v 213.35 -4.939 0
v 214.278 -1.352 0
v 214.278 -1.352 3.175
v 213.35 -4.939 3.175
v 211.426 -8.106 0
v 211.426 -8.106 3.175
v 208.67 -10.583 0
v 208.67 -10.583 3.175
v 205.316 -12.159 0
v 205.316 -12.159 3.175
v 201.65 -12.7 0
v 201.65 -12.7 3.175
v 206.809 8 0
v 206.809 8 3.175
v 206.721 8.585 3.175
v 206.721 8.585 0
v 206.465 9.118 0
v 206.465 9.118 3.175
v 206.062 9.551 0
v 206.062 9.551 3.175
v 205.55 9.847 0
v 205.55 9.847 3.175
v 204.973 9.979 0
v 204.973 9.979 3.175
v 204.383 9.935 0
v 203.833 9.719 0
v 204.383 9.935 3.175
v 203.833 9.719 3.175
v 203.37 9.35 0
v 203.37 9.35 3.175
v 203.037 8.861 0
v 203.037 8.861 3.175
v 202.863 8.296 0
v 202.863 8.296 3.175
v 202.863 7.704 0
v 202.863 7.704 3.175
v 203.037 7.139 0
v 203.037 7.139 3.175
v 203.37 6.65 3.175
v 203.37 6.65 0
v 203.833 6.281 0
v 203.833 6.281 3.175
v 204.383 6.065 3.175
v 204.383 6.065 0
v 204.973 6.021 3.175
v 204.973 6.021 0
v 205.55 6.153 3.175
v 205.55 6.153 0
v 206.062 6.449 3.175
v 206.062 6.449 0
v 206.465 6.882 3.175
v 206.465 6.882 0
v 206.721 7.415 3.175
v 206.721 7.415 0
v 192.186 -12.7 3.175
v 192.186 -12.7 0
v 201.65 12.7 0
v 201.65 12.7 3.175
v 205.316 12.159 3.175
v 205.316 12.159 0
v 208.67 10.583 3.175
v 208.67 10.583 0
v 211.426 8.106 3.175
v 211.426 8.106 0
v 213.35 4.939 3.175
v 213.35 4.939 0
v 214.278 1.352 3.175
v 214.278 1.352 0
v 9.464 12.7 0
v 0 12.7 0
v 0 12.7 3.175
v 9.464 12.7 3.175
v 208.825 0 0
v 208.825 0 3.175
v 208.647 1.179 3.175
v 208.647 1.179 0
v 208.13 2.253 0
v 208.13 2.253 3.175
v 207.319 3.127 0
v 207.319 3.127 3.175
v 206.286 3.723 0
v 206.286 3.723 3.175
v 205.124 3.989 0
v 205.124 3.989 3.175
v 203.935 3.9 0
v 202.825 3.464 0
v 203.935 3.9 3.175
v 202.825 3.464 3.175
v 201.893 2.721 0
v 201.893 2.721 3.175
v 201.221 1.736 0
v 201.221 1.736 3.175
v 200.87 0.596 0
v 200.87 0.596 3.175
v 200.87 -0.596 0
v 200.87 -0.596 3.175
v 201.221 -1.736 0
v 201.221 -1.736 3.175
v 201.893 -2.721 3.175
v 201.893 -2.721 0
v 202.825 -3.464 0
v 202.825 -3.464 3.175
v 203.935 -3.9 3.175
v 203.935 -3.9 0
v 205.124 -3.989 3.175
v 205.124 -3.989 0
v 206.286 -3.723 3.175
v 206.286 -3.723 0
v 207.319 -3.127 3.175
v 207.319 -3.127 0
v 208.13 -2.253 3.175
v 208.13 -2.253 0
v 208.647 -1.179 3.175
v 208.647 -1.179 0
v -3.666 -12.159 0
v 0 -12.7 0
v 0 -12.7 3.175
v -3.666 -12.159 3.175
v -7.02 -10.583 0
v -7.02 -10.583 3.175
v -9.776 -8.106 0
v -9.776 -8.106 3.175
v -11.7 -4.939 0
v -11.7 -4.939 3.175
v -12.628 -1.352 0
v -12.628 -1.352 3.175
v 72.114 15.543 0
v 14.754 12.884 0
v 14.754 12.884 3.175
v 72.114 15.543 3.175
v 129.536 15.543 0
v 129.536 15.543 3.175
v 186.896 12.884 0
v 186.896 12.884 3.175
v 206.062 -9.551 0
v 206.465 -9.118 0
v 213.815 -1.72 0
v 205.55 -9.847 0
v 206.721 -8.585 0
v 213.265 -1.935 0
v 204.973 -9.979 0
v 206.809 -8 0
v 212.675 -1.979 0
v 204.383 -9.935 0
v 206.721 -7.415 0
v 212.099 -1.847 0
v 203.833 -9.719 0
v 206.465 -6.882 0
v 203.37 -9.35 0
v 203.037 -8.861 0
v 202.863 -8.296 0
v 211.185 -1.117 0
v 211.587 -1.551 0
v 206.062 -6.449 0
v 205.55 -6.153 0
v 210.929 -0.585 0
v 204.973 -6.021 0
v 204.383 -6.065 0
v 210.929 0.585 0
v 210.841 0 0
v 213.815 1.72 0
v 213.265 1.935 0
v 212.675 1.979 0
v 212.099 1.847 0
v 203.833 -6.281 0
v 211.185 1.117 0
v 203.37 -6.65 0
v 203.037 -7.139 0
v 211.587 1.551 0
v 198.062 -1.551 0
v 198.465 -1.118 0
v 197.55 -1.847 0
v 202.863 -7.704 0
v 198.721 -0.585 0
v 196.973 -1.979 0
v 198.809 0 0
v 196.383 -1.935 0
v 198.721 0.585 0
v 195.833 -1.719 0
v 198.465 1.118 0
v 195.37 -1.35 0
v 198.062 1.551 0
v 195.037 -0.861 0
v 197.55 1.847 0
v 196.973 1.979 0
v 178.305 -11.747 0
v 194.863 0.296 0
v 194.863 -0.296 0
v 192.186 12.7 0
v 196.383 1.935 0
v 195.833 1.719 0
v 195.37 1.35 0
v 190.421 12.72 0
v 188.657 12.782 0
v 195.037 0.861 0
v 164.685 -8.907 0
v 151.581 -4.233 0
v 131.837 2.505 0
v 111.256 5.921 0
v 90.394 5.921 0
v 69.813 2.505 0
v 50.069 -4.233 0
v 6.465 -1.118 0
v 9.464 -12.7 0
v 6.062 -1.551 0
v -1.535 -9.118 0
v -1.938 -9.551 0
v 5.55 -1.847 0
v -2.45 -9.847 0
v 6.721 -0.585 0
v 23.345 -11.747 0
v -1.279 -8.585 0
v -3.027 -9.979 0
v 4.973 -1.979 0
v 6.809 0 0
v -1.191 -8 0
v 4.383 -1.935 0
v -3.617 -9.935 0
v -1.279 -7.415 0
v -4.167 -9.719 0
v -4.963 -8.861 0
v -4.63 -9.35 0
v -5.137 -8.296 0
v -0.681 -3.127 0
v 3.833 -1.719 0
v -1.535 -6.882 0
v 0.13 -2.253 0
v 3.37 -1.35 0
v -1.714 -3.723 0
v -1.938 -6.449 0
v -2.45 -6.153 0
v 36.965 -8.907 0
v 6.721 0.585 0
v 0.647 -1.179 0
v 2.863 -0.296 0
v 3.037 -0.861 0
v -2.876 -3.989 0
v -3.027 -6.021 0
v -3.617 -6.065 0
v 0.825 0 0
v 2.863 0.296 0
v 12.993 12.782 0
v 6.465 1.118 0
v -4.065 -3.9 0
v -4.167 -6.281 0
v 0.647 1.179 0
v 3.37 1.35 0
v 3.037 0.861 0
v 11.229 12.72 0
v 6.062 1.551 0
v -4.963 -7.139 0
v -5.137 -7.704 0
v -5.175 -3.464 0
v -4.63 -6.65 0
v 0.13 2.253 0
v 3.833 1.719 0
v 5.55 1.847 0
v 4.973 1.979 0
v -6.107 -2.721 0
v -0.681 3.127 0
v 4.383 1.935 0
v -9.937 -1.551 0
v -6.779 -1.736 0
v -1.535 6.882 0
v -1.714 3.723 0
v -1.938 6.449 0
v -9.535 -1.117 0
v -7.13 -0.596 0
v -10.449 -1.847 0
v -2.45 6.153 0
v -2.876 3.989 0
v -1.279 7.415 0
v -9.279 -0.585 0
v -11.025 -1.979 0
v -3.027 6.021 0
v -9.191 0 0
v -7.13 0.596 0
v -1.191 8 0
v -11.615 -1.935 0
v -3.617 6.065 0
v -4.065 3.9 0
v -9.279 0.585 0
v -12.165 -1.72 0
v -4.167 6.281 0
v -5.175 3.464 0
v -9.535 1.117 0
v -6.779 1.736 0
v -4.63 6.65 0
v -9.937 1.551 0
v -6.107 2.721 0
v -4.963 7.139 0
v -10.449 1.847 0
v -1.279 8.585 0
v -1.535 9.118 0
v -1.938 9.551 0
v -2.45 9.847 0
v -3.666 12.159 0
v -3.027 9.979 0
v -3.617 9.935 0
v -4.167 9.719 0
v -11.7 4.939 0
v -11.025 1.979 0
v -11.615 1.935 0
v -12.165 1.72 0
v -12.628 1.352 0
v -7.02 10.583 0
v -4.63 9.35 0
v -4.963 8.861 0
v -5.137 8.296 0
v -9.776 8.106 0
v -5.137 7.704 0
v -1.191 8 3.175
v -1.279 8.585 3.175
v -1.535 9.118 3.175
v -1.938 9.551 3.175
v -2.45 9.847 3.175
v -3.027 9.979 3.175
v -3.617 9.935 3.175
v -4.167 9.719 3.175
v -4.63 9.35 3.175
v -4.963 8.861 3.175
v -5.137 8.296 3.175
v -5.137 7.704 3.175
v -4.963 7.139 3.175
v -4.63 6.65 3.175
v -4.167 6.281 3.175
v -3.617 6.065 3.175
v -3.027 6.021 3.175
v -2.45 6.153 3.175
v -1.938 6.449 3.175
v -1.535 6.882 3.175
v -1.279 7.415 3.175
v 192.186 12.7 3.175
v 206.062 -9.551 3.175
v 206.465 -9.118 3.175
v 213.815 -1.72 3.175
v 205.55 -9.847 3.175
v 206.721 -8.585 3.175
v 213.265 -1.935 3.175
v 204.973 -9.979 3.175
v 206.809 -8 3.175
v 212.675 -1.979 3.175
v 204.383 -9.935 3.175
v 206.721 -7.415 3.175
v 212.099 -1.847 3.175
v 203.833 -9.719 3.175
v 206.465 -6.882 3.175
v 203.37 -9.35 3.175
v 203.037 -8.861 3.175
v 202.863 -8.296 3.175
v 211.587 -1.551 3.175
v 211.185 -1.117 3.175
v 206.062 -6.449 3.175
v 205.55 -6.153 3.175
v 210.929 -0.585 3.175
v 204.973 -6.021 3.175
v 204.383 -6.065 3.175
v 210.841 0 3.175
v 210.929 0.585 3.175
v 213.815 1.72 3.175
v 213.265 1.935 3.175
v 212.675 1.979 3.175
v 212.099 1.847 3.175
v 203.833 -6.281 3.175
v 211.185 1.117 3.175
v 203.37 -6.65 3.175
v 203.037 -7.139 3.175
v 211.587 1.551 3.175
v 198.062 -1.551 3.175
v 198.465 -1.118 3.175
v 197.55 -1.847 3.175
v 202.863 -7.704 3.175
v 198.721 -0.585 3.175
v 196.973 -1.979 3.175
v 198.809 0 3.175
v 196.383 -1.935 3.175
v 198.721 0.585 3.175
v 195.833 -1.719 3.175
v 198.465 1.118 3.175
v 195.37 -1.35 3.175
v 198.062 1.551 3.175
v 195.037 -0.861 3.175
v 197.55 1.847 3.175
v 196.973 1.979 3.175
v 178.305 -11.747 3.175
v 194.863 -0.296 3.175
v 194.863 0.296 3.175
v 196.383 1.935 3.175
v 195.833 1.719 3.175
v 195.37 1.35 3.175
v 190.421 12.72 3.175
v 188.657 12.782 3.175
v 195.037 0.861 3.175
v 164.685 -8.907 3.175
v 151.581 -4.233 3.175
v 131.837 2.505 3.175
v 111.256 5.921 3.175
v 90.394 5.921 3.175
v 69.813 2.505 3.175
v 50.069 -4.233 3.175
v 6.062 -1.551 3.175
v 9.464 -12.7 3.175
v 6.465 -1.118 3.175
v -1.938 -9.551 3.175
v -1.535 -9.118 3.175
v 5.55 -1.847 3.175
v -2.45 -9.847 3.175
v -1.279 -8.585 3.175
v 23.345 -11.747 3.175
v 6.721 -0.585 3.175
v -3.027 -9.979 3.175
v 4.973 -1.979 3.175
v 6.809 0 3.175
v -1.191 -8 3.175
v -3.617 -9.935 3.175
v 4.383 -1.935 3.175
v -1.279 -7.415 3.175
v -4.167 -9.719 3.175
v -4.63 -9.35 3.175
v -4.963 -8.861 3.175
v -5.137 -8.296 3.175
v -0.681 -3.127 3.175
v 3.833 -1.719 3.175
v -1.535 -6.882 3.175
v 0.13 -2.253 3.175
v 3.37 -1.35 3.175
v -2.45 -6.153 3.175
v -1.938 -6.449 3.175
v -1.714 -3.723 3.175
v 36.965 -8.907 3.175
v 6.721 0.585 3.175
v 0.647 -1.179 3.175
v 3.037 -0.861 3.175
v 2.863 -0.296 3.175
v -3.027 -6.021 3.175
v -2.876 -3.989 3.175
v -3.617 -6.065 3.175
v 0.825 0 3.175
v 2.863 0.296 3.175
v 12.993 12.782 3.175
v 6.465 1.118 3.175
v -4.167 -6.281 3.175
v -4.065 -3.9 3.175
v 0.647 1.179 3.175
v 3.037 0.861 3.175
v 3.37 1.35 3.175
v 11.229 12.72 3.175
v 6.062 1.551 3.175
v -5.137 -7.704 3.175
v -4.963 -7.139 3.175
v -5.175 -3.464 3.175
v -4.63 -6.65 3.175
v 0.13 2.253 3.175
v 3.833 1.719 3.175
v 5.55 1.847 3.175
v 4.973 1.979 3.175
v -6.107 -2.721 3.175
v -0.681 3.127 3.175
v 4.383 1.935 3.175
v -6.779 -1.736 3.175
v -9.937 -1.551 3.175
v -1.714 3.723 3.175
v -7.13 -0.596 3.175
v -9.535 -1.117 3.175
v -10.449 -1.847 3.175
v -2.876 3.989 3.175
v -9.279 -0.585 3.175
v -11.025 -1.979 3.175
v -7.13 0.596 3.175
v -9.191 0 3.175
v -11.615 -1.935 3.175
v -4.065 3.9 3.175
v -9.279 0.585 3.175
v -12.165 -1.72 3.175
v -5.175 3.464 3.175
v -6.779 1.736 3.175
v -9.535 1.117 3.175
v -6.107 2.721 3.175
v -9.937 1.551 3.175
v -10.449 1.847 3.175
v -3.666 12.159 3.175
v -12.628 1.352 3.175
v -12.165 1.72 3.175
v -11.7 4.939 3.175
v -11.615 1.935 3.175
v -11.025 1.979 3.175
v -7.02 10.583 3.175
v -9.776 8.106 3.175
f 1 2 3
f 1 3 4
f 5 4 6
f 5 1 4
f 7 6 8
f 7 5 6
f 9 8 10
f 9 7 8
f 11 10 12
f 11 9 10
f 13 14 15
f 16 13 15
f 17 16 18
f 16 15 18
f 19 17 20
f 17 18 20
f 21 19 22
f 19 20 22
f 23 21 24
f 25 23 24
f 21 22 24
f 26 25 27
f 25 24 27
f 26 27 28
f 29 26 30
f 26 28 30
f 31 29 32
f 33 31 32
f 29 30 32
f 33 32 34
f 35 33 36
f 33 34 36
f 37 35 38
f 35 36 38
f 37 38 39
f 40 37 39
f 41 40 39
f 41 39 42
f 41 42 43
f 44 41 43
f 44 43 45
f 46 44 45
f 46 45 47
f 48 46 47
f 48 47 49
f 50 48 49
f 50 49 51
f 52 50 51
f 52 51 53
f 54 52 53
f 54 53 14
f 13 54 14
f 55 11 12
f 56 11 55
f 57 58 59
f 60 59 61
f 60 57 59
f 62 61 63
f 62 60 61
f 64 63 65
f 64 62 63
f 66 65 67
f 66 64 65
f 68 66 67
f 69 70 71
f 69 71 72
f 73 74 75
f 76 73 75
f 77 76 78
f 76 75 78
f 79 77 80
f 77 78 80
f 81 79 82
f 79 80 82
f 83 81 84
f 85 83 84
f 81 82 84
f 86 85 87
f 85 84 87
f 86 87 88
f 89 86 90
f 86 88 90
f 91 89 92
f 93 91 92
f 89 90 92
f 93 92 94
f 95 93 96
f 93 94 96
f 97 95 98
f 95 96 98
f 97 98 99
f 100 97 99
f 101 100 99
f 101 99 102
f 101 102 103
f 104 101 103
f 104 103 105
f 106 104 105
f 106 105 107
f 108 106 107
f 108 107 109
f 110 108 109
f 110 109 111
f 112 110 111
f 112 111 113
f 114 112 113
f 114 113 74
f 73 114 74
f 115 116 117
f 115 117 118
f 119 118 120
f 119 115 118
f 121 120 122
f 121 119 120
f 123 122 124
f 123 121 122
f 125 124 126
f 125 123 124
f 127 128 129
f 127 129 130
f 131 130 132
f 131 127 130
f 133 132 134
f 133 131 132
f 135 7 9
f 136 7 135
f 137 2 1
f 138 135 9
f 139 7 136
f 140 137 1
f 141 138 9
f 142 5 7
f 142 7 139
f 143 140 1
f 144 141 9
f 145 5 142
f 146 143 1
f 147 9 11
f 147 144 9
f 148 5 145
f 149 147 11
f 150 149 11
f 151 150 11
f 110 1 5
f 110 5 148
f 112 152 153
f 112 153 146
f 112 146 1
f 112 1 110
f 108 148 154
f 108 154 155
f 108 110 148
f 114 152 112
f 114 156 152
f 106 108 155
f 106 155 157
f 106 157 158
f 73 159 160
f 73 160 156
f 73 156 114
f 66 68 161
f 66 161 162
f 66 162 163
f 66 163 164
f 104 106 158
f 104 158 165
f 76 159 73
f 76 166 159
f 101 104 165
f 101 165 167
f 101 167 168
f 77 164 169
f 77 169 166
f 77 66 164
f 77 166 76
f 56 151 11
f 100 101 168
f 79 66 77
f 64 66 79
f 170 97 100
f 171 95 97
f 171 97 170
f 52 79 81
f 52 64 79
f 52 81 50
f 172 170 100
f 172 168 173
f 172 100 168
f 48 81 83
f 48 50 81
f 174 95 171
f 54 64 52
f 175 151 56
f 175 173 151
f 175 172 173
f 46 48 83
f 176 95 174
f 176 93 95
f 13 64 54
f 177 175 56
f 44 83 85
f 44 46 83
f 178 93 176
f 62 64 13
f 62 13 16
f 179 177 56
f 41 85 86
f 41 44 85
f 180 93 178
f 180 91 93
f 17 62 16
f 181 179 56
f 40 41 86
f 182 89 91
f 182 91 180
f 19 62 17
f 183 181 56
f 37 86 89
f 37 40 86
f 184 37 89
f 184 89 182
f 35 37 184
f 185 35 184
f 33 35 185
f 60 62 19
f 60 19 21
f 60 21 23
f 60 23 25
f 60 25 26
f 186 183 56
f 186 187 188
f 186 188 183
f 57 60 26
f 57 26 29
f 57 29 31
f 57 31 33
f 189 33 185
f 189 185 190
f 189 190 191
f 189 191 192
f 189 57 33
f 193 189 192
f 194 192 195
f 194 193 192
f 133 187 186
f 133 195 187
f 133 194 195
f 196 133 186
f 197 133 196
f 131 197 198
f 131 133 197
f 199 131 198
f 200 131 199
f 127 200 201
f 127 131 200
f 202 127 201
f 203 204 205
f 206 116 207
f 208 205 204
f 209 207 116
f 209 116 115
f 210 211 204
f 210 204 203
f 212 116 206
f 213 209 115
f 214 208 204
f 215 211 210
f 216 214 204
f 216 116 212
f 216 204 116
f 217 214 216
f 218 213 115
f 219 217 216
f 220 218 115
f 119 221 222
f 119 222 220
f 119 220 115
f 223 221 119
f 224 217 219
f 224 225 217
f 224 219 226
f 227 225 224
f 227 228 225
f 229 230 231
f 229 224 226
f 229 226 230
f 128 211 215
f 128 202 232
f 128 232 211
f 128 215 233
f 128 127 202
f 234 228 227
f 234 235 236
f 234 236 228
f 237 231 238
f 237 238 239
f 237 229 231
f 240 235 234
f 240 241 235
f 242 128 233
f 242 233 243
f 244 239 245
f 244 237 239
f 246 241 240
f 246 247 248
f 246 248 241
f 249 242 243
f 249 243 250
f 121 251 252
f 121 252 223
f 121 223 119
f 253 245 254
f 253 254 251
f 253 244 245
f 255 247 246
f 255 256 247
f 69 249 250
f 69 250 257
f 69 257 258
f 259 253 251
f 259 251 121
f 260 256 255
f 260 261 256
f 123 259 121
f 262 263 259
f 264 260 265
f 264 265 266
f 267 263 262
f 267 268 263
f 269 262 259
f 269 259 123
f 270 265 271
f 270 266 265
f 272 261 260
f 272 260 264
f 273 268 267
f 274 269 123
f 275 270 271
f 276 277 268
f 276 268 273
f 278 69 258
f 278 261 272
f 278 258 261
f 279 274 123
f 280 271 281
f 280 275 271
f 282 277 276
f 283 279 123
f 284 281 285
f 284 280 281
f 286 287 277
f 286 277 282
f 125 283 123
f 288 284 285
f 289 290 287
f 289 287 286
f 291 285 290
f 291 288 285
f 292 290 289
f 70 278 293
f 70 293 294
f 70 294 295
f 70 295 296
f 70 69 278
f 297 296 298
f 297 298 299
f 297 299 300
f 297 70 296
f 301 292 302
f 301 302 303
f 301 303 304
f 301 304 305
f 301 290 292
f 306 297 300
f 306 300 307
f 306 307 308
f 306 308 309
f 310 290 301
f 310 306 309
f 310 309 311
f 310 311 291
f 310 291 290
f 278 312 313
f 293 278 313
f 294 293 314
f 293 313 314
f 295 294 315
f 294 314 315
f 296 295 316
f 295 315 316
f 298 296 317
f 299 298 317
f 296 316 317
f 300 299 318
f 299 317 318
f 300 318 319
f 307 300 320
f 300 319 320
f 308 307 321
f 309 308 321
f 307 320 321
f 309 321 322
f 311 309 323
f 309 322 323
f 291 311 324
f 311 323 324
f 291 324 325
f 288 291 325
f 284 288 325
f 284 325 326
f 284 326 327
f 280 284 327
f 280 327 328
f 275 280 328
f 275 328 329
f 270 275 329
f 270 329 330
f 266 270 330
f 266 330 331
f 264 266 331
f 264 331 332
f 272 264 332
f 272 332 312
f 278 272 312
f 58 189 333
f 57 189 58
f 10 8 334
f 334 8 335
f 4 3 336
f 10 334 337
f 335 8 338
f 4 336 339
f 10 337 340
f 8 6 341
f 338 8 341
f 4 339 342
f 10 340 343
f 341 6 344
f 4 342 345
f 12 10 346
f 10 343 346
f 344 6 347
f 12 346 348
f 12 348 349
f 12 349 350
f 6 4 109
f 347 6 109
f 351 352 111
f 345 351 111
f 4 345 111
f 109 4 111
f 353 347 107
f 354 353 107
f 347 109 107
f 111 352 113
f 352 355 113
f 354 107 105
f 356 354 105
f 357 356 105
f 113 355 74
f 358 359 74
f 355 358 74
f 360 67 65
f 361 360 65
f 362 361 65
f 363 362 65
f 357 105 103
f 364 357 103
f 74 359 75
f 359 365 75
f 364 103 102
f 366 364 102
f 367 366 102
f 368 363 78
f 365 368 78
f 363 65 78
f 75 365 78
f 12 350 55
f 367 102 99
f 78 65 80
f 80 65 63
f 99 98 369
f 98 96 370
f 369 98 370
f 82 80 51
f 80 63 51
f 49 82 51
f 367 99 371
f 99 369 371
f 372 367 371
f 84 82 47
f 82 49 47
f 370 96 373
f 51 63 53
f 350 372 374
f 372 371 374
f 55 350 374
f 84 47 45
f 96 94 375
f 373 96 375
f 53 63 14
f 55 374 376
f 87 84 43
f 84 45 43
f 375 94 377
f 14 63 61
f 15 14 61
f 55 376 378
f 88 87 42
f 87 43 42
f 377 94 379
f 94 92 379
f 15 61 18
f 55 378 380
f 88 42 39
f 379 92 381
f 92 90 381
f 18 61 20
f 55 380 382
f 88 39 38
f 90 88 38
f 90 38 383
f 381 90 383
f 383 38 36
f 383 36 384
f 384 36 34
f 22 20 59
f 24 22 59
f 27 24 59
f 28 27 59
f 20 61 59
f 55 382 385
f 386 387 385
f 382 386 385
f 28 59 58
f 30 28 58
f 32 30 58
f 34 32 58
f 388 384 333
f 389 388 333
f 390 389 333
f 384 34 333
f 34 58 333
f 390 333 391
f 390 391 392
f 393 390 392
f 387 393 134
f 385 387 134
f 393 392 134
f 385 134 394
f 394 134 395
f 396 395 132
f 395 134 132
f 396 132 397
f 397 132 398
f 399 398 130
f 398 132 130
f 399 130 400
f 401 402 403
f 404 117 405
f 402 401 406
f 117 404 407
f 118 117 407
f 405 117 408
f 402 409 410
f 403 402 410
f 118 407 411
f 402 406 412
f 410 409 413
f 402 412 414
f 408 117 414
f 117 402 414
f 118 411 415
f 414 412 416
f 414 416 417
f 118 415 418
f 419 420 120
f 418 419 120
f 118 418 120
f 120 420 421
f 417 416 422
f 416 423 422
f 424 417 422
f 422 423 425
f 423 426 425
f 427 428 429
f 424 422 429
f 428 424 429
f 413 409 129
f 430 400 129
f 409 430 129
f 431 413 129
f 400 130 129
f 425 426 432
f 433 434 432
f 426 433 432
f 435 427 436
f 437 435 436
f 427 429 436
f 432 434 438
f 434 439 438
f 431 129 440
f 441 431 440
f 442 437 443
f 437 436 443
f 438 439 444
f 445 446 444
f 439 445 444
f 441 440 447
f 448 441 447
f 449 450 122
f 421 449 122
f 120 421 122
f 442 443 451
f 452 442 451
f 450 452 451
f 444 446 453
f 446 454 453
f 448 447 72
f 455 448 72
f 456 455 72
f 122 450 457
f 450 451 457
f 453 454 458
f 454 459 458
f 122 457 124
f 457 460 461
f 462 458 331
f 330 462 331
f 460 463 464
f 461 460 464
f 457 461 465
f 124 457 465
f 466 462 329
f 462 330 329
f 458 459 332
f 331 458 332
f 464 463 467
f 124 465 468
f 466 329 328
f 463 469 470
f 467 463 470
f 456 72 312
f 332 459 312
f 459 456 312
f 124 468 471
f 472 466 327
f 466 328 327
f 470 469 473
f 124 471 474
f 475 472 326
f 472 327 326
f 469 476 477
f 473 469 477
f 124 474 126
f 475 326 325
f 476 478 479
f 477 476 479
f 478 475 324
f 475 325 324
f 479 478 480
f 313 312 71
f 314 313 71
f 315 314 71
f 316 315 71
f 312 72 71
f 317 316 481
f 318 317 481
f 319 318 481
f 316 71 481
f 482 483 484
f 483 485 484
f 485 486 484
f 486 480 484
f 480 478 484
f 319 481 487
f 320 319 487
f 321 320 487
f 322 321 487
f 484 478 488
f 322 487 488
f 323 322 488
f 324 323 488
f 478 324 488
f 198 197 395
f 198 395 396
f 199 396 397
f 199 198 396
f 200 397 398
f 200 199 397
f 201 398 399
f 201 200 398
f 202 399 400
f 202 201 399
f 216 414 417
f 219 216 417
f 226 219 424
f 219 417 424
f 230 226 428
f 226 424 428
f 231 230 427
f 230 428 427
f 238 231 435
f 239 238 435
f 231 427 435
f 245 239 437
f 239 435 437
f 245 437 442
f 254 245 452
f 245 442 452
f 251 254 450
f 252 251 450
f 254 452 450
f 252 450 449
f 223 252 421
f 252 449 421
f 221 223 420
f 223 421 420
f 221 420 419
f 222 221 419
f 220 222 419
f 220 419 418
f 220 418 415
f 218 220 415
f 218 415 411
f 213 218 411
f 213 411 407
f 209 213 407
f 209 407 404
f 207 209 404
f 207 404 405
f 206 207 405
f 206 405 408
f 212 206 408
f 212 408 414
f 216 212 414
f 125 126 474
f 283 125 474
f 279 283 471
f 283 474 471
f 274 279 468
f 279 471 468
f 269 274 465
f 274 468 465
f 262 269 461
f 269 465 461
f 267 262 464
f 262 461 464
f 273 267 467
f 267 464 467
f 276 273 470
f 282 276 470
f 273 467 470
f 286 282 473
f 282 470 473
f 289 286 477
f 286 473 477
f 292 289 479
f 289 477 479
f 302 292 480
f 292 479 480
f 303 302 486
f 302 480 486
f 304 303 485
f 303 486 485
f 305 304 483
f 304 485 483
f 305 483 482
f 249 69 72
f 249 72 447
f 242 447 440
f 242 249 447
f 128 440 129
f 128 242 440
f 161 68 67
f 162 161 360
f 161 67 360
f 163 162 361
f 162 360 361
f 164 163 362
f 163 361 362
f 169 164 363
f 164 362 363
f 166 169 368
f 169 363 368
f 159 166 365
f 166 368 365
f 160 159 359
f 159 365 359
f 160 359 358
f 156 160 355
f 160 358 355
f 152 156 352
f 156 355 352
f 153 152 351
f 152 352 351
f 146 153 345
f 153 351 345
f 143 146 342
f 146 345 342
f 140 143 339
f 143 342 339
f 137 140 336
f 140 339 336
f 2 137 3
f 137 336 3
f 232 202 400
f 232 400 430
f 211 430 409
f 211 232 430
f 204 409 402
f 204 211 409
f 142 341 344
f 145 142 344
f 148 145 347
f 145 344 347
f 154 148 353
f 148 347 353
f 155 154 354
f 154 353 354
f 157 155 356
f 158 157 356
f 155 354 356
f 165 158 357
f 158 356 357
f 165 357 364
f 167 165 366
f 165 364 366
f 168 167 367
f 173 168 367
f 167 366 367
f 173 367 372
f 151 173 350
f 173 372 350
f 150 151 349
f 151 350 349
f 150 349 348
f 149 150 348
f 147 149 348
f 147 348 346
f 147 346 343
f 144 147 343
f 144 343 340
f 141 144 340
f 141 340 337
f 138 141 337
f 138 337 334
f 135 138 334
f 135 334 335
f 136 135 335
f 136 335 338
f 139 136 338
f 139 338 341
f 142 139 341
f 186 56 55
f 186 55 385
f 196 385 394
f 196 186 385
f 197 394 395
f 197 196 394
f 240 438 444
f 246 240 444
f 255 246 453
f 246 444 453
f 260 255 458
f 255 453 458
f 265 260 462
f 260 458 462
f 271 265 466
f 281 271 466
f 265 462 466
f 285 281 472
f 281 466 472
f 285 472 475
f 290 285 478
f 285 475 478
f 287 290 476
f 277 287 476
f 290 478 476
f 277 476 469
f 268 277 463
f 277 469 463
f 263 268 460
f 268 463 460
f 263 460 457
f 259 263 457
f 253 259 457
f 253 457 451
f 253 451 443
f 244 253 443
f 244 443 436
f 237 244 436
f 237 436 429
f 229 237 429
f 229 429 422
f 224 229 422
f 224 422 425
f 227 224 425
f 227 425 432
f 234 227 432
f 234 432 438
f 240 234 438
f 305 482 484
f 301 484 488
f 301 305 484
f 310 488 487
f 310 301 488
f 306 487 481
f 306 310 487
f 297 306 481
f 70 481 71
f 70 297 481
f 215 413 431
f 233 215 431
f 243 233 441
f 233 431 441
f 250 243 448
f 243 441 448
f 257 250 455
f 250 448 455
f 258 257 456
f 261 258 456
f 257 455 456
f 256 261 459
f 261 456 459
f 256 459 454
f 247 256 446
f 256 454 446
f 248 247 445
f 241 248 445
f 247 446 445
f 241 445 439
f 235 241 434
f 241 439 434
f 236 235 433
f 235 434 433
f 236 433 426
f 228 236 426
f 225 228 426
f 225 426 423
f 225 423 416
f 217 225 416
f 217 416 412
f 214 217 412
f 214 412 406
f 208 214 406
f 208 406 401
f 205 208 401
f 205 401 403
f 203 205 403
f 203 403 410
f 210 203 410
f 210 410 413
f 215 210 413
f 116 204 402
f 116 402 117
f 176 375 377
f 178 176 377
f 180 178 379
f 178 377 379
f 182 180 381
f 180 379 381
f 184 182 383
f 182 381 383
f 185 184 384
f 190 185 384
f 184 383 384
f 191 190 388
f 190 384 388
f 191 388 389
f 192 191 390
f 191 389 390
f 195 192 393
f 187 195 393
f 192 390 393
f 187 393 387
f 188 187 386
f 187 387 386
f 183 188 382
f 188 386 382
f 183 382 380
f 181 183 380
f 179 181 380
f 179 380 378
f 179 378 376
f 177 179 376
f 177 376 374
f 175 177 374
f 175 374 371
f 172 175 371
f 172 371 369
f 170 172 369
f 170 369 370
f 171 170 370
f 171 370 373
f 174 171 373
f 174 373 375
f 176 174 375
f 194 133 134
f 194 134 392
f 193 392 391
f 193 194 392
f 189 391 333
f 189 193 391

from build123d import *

# Parameters (mm, degrees)
BOSS_EXTRUDE1_DEPTH = 3.175
SKETCH3_R           = 1.984375
SKETCH3_R_2         = 4
CUT_EXTRUDE1_DEPTH  = 4.175


with BuildPart() as part:
    # Sketch2 → Boss-Extrude1 (new body)
    with BuildSketch(Plane.XY):
        with BuildLine():
            Line((0, 12.7), (9.464409507, 12.7))
            ThreePointArc((9.464409507, 12.7), (12.110944898, 12.745972855), (14.754286883, 12.883835947))
            ThreePointArc((14.754286883, 12.883835947), (100.825000026, 15.875), (186.895713169, 12.883835947))
            ThreePointArc((186.895713169, 12.883835947), (189.539055154, 12.745972855), (192.185590545, 12.7))
            Line((192.185590545, 12.7), (201.650000052, 12.7))
            ThreePointArc((201.650000052, 12.7), (214.350000052, 0), (201.650000052, -12.7))
            Line((201.650000052, -12.7), (192.185590545, -12.7))
            ThreePointArc((192.185590545, -12.7), (171.44657739, -10.560813054), (151.580883648, -4.233333333))
            ThreePointArc((151.580883648, -4.233333333), (100.825000026, 6.35), (50.069116404, -4.233333333))
            ThreePointArc((50.069116404, -4.233333333), (30.203422662, -10.560813054), (9.464409507, -12.7))
            Line((9.464409507, -12.7), (0, -12.7))
            ThreePointArc((0, -12.7), (-12.7, 0), (0, 12.7))
        make_face()
    extrude(amount=BOSS_EXTRUDE1_DEPTH)

    # Sketch3 → Cut-Extrude1 (cut, through all)
    with BuildSketch(Plane.XY.offset(3.175)):
        with Locations((-3.175, 8)):
            Circle(SKETCH3_R)
        with Locations((-3.175, 0)):
            Circle(SKETCH3_R_2)
        with Locations((204.825000052, 0)):
            Circle(SKETCH3_R_2)
        with Locations((204.825000052, 8)):
            Circle(SKETCH3_R)
        with Locations((212.825000052, 0)):
            Circle(SKETCH3_R)
        with Locations((204.825000052, -8)):
            Circle(SKETCH3_R)
        with Locations((196.825000052, 0)):
            Circle(SKETCH3_R)
        with Locations((4.825, 0)):
            Circle(SKETCH3_R)
        with Locations((-3.175, -8)):
            Circle(SKETCH3_R)
        with Locations((-11.175, 0)):
            Circle(SKETCH3_R)
    extrude(amount=-CUT_EXTRUDE1_DEPTH, mode=Mode.SUBTRACT)


solid = part.part
